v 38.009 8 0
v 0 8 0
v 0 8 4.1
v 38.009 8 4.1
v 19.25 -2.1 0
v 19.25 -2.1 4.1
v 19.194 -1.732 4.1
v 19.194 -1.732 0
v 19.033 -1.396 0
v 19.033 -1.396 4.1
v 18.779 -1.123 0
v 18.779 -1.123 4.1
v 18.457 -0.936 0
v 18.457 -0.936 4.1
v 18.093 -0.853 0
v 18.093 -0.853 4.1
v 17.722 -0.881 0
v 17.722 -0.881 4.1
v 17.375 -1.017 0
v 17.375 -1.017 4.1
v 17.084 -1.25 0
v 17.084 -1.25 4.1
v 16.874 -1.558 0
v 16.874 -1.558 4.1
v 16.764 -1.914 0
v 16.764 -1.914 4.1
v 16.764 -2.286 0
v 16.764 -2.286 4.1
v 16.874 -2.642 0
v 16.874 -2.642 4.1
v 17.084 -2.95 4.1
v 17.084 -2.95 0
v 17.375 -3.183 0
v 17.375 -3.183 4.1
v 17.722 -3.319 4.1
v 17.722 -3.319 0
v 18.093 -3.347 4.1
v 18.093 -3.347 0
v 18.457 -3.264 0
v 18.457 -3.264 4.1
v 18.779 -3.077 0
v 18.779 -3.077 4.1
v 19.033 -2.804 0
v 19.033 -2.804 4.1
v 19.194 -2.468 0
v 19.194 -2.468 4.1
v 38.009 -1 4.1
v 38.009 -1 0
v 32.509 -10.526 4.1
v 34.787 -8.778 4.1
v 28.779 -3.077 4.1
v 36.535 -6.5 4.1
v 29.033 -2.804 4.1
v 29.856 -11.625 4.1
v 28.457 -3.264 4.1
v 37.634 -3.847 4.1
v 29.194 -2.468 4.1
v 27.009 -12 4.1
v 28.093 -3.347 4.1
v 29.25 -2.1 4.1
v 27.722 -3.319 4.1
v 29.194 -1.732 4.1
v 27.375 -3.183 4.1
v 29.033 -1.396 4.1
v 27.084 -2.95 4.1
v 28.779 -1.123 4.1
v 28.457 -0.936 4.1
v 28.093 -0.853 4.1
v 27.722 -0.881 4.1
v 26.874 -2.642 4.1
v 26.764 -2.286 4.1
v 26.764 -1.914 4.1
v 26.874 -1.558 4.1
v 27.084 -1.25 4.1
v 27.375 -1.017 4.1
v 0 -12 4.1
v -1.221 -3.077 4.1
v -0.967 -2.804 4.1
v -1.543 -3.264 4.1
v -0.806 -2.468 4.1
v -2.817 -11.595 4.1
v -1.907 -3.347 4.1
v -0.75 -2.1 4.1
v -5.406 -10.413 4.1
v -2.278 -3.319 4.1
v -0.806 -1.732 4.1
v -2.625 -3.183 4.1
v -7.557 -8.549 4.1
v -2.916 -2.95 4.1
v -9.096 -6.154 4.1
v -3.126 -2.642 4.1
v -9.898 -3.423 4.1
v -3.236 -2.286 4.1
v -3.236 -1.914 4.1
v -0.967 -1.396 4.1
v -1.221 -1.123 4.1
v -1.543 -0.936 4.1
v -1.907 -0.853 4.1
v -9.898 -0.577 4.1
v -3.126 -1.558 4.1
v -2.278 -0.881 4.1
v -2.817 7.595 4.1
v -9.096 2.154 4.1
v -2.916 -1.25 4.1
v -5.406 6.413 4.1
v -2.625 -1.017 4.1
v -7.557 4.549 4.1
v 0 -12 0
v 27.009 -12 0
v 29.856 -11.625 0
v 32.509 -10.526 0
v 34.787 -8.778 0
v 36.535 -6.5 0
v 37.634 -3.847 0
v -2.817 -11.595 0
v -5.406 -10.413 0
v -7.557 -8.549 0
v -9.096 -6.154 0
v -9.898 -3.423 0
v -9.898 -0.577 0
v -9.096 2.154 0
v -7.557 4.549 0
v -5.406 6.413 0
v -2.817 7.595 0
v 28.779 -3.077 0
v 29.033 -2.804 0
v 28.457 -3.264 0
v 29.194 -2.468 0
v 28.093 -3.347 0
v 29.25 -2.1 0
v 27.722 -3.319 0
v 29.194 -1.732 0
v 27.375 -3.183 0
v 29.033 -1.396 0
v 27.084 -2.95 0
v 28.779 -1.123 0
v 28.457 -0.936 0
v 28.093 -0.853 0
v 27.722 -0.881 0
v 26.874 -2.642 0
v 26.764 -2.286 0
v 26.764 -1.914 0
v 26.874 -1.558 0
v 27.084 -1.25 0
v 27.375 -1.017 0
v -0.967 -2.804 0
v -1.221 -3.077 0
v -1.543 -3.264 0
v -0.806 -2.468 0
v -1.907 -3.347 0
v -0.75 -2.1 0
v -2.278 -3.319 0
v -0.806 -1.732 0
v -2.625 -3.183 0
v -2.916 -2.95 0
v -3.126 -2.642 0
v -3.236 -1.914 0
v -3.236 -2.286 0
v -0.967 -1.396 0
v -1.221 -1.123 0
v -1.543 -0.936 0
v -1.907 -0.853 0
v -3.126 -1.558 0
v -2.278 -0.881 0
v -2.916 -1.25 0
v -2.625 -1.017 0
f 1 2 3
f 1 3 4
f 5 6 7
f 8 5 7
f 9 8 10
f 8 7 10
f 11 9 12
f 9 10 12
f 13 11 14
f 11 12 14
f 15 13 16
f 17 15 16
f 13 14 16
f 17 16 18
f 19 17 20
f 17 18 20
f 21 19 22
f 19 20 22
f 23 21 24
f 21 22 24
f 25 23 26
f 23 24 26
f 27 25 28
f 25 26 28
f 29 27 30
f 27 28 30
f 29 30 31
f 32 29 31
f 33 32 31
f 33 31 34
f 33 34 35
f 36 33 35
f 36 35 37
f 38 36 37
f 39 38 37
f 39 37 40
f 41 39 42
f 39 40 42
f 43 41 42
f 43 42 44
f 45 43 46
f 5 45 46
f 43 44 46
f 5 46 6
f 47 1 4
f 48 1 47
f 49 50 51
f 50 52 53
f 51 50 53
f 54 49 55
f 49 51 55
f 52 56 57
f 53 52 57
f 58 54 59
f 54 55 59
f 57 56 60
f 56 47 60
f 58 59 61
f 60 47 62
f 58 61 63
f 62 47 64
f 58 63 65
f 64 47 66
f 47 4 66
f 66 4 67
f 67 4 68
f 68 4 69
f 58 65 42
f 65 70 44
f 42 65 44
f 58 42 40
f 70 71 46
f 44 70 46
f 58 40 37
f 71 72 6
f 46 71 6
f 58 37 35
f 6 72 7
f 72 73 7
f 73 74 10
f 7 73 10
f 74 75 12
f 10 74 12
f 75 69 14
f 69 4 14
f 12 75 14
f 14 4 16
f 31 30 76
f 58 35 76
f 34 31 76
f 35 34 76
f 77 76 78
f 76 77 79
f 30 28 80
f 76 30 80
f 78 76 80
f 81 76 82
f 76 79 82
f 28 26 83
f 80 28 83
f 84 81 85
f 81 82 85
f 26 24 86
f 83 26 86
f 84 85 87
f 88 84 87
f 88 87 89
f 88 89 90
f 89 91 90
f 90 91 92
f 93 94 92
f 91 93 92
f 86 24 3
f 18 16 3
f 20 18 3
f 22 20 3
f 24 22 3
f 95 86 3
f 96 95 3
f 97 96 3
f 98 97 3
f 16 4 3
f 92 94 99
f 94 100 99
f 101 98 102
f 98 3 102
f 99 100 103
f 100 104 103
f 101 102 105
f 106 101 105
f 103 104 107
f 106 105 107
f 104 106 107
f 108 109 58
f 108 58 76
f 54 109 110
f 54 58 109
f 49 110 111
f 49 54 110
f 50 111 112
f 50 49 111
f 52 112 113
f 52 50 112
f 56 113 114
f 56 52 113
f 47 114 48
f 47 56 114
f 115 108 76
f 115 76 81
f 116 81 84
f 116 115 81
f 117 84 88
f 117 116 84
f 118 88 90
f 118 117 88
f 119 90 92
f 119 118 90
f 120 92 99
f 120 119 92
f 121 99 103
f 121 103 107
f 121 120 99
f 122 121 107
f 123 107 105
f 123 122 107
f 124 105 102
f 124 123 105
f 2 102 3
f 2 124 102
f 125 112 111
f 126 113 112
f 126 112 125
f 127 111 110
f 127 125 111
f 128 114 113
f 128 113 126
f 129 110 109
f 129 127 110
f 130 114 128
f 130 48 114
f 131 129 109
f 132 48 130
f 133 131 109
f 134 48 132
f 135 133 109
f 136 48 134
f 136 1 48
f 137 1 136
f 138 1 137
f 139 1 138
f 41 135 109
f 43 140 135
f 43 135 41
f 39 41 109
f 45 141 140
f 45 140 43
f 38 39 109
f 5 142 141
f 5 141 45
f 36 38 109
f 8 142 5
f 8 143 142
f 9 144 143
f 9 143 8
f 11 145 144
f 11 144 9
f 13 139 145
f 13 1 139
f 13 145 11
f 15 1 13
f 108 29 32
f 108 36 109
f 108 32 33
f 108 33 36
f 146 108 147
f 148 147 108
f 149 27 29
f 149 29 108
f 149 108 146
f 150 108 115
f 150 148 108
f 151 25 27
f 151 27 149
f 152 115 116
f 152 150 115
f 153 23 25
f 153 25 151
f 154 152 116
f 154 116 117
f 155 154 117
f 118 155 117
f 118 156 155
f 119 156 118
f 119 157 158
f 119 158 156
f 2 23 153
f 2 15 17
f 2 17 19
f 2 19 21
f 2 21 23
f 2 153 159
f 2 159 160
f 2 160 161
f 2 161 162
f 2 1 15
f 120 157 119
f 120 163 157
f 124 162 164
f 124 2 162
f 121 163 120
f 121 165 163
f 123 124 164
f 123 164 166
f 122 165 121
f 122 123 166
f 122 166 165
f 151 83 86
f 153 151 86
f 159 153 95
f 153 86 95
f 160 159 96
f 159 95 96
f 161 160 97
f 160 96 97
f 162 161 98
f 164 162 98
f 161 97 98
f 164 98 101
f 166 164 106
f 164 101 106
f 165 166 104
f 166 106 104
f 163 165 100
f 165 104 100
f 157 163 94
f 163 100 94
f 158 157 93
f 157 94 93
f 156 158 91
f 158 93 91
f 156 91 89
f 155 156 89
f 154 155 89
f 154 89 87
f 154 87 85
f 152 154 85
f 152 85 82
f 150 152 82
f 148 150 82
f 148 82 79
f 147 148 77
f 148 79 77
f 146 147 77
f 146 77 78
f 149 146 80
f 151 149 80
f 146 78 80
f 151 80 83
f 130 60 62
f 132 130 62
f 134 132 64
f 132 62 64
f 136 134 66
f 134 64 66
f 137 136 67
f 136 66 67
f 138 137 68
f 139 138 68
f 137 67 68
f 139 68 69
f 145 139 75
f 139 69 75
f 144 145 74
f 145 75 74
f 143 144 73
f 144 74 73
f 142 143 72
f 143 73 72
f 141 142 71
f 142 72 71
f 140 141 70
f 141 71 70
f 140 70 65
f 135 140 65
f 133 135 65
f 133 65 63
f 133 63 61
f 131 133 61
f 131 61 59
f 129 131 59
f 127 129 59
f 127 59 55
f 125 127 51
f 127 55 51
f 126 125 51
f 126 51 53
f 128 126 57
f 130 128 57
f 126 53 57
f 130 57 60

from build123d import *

# Parameters (mm, degrees)
ESTRUSIONE_ESTRUSIONE1_DEPTH = 4.1
SCHIZZO2_R                   = 1.25
TAGLIO_ESTRUSIONE1_DEPTH     = 4.1
RACCORDO1_DEPTH              = 4.1
RACCORDO2_R                  = 11


with BuildPart() as part:
    # Schizzo1 → Estrusione-Estrusione1 (new body)
    with BuildSketch(Plane.XY):
        with BuildLine():
            Line((-12, 0), (-12, 8))
            Line((-12, 8), (23.997894166, 8))
            Line((23.997894166, 8), (38.008621711, 8))
            Line((38.008621711, 8), (38.008621711, -12))
            Line((38.008621711, -12), (0, -12))
            ThreePointArc((0, -12), (-8.485281374, -8.485281374), (-12, 0))
        make_face()
    extrude(amount=ESTRUSIONE_ESTRUSIONE1_DEPTH)

    # Schizzo2 → Taglio-Estrusione1 (cut)
    with BuildSketch(Plane.XY.offset(4.1)):
        with Locations((-2, -2.1)):
            Circle(SCHIZZO2_R)
        with Locations((28, -2.1)):
            Circle(SCHIZZO2_R)
        with Locations((18, -2.1)):
            Circle(SCHIZZO2_R)
    extrude(amount=-TAGLIO_ESTRUSIONE1_DEPTH, mode=Mode.SUBTRACT)

    # Raccordo1: read off the stored shape, not the designer's step
    # Raccordo1 outline → Raccordo1 (cut)
    with BuildSketch(Plane.XY):
        with BuildLine():
            ThreePointArc((-12, 0), (-8.485281374, -8.485281374), (0, -12))
            ThreePointArc((0, -12), (-10, -2), (0, 8))
            Line((0, 8), (-12, 8))
            Line((-12, 8), (-12, 0))
        make_face()
    extrude(amount=RACCORDO1_DEPTH, mode=Mode.SUBTRACT)

    # Raccordo2
    raccordo2_edges = [part.edges().sort_by_distance(p)[0] for p in [
        (38.008621711, -12, 2.05),
    ]]
    fillet(raccordo2_edges, radius=RACCORDO2_R)


solid = part.part
